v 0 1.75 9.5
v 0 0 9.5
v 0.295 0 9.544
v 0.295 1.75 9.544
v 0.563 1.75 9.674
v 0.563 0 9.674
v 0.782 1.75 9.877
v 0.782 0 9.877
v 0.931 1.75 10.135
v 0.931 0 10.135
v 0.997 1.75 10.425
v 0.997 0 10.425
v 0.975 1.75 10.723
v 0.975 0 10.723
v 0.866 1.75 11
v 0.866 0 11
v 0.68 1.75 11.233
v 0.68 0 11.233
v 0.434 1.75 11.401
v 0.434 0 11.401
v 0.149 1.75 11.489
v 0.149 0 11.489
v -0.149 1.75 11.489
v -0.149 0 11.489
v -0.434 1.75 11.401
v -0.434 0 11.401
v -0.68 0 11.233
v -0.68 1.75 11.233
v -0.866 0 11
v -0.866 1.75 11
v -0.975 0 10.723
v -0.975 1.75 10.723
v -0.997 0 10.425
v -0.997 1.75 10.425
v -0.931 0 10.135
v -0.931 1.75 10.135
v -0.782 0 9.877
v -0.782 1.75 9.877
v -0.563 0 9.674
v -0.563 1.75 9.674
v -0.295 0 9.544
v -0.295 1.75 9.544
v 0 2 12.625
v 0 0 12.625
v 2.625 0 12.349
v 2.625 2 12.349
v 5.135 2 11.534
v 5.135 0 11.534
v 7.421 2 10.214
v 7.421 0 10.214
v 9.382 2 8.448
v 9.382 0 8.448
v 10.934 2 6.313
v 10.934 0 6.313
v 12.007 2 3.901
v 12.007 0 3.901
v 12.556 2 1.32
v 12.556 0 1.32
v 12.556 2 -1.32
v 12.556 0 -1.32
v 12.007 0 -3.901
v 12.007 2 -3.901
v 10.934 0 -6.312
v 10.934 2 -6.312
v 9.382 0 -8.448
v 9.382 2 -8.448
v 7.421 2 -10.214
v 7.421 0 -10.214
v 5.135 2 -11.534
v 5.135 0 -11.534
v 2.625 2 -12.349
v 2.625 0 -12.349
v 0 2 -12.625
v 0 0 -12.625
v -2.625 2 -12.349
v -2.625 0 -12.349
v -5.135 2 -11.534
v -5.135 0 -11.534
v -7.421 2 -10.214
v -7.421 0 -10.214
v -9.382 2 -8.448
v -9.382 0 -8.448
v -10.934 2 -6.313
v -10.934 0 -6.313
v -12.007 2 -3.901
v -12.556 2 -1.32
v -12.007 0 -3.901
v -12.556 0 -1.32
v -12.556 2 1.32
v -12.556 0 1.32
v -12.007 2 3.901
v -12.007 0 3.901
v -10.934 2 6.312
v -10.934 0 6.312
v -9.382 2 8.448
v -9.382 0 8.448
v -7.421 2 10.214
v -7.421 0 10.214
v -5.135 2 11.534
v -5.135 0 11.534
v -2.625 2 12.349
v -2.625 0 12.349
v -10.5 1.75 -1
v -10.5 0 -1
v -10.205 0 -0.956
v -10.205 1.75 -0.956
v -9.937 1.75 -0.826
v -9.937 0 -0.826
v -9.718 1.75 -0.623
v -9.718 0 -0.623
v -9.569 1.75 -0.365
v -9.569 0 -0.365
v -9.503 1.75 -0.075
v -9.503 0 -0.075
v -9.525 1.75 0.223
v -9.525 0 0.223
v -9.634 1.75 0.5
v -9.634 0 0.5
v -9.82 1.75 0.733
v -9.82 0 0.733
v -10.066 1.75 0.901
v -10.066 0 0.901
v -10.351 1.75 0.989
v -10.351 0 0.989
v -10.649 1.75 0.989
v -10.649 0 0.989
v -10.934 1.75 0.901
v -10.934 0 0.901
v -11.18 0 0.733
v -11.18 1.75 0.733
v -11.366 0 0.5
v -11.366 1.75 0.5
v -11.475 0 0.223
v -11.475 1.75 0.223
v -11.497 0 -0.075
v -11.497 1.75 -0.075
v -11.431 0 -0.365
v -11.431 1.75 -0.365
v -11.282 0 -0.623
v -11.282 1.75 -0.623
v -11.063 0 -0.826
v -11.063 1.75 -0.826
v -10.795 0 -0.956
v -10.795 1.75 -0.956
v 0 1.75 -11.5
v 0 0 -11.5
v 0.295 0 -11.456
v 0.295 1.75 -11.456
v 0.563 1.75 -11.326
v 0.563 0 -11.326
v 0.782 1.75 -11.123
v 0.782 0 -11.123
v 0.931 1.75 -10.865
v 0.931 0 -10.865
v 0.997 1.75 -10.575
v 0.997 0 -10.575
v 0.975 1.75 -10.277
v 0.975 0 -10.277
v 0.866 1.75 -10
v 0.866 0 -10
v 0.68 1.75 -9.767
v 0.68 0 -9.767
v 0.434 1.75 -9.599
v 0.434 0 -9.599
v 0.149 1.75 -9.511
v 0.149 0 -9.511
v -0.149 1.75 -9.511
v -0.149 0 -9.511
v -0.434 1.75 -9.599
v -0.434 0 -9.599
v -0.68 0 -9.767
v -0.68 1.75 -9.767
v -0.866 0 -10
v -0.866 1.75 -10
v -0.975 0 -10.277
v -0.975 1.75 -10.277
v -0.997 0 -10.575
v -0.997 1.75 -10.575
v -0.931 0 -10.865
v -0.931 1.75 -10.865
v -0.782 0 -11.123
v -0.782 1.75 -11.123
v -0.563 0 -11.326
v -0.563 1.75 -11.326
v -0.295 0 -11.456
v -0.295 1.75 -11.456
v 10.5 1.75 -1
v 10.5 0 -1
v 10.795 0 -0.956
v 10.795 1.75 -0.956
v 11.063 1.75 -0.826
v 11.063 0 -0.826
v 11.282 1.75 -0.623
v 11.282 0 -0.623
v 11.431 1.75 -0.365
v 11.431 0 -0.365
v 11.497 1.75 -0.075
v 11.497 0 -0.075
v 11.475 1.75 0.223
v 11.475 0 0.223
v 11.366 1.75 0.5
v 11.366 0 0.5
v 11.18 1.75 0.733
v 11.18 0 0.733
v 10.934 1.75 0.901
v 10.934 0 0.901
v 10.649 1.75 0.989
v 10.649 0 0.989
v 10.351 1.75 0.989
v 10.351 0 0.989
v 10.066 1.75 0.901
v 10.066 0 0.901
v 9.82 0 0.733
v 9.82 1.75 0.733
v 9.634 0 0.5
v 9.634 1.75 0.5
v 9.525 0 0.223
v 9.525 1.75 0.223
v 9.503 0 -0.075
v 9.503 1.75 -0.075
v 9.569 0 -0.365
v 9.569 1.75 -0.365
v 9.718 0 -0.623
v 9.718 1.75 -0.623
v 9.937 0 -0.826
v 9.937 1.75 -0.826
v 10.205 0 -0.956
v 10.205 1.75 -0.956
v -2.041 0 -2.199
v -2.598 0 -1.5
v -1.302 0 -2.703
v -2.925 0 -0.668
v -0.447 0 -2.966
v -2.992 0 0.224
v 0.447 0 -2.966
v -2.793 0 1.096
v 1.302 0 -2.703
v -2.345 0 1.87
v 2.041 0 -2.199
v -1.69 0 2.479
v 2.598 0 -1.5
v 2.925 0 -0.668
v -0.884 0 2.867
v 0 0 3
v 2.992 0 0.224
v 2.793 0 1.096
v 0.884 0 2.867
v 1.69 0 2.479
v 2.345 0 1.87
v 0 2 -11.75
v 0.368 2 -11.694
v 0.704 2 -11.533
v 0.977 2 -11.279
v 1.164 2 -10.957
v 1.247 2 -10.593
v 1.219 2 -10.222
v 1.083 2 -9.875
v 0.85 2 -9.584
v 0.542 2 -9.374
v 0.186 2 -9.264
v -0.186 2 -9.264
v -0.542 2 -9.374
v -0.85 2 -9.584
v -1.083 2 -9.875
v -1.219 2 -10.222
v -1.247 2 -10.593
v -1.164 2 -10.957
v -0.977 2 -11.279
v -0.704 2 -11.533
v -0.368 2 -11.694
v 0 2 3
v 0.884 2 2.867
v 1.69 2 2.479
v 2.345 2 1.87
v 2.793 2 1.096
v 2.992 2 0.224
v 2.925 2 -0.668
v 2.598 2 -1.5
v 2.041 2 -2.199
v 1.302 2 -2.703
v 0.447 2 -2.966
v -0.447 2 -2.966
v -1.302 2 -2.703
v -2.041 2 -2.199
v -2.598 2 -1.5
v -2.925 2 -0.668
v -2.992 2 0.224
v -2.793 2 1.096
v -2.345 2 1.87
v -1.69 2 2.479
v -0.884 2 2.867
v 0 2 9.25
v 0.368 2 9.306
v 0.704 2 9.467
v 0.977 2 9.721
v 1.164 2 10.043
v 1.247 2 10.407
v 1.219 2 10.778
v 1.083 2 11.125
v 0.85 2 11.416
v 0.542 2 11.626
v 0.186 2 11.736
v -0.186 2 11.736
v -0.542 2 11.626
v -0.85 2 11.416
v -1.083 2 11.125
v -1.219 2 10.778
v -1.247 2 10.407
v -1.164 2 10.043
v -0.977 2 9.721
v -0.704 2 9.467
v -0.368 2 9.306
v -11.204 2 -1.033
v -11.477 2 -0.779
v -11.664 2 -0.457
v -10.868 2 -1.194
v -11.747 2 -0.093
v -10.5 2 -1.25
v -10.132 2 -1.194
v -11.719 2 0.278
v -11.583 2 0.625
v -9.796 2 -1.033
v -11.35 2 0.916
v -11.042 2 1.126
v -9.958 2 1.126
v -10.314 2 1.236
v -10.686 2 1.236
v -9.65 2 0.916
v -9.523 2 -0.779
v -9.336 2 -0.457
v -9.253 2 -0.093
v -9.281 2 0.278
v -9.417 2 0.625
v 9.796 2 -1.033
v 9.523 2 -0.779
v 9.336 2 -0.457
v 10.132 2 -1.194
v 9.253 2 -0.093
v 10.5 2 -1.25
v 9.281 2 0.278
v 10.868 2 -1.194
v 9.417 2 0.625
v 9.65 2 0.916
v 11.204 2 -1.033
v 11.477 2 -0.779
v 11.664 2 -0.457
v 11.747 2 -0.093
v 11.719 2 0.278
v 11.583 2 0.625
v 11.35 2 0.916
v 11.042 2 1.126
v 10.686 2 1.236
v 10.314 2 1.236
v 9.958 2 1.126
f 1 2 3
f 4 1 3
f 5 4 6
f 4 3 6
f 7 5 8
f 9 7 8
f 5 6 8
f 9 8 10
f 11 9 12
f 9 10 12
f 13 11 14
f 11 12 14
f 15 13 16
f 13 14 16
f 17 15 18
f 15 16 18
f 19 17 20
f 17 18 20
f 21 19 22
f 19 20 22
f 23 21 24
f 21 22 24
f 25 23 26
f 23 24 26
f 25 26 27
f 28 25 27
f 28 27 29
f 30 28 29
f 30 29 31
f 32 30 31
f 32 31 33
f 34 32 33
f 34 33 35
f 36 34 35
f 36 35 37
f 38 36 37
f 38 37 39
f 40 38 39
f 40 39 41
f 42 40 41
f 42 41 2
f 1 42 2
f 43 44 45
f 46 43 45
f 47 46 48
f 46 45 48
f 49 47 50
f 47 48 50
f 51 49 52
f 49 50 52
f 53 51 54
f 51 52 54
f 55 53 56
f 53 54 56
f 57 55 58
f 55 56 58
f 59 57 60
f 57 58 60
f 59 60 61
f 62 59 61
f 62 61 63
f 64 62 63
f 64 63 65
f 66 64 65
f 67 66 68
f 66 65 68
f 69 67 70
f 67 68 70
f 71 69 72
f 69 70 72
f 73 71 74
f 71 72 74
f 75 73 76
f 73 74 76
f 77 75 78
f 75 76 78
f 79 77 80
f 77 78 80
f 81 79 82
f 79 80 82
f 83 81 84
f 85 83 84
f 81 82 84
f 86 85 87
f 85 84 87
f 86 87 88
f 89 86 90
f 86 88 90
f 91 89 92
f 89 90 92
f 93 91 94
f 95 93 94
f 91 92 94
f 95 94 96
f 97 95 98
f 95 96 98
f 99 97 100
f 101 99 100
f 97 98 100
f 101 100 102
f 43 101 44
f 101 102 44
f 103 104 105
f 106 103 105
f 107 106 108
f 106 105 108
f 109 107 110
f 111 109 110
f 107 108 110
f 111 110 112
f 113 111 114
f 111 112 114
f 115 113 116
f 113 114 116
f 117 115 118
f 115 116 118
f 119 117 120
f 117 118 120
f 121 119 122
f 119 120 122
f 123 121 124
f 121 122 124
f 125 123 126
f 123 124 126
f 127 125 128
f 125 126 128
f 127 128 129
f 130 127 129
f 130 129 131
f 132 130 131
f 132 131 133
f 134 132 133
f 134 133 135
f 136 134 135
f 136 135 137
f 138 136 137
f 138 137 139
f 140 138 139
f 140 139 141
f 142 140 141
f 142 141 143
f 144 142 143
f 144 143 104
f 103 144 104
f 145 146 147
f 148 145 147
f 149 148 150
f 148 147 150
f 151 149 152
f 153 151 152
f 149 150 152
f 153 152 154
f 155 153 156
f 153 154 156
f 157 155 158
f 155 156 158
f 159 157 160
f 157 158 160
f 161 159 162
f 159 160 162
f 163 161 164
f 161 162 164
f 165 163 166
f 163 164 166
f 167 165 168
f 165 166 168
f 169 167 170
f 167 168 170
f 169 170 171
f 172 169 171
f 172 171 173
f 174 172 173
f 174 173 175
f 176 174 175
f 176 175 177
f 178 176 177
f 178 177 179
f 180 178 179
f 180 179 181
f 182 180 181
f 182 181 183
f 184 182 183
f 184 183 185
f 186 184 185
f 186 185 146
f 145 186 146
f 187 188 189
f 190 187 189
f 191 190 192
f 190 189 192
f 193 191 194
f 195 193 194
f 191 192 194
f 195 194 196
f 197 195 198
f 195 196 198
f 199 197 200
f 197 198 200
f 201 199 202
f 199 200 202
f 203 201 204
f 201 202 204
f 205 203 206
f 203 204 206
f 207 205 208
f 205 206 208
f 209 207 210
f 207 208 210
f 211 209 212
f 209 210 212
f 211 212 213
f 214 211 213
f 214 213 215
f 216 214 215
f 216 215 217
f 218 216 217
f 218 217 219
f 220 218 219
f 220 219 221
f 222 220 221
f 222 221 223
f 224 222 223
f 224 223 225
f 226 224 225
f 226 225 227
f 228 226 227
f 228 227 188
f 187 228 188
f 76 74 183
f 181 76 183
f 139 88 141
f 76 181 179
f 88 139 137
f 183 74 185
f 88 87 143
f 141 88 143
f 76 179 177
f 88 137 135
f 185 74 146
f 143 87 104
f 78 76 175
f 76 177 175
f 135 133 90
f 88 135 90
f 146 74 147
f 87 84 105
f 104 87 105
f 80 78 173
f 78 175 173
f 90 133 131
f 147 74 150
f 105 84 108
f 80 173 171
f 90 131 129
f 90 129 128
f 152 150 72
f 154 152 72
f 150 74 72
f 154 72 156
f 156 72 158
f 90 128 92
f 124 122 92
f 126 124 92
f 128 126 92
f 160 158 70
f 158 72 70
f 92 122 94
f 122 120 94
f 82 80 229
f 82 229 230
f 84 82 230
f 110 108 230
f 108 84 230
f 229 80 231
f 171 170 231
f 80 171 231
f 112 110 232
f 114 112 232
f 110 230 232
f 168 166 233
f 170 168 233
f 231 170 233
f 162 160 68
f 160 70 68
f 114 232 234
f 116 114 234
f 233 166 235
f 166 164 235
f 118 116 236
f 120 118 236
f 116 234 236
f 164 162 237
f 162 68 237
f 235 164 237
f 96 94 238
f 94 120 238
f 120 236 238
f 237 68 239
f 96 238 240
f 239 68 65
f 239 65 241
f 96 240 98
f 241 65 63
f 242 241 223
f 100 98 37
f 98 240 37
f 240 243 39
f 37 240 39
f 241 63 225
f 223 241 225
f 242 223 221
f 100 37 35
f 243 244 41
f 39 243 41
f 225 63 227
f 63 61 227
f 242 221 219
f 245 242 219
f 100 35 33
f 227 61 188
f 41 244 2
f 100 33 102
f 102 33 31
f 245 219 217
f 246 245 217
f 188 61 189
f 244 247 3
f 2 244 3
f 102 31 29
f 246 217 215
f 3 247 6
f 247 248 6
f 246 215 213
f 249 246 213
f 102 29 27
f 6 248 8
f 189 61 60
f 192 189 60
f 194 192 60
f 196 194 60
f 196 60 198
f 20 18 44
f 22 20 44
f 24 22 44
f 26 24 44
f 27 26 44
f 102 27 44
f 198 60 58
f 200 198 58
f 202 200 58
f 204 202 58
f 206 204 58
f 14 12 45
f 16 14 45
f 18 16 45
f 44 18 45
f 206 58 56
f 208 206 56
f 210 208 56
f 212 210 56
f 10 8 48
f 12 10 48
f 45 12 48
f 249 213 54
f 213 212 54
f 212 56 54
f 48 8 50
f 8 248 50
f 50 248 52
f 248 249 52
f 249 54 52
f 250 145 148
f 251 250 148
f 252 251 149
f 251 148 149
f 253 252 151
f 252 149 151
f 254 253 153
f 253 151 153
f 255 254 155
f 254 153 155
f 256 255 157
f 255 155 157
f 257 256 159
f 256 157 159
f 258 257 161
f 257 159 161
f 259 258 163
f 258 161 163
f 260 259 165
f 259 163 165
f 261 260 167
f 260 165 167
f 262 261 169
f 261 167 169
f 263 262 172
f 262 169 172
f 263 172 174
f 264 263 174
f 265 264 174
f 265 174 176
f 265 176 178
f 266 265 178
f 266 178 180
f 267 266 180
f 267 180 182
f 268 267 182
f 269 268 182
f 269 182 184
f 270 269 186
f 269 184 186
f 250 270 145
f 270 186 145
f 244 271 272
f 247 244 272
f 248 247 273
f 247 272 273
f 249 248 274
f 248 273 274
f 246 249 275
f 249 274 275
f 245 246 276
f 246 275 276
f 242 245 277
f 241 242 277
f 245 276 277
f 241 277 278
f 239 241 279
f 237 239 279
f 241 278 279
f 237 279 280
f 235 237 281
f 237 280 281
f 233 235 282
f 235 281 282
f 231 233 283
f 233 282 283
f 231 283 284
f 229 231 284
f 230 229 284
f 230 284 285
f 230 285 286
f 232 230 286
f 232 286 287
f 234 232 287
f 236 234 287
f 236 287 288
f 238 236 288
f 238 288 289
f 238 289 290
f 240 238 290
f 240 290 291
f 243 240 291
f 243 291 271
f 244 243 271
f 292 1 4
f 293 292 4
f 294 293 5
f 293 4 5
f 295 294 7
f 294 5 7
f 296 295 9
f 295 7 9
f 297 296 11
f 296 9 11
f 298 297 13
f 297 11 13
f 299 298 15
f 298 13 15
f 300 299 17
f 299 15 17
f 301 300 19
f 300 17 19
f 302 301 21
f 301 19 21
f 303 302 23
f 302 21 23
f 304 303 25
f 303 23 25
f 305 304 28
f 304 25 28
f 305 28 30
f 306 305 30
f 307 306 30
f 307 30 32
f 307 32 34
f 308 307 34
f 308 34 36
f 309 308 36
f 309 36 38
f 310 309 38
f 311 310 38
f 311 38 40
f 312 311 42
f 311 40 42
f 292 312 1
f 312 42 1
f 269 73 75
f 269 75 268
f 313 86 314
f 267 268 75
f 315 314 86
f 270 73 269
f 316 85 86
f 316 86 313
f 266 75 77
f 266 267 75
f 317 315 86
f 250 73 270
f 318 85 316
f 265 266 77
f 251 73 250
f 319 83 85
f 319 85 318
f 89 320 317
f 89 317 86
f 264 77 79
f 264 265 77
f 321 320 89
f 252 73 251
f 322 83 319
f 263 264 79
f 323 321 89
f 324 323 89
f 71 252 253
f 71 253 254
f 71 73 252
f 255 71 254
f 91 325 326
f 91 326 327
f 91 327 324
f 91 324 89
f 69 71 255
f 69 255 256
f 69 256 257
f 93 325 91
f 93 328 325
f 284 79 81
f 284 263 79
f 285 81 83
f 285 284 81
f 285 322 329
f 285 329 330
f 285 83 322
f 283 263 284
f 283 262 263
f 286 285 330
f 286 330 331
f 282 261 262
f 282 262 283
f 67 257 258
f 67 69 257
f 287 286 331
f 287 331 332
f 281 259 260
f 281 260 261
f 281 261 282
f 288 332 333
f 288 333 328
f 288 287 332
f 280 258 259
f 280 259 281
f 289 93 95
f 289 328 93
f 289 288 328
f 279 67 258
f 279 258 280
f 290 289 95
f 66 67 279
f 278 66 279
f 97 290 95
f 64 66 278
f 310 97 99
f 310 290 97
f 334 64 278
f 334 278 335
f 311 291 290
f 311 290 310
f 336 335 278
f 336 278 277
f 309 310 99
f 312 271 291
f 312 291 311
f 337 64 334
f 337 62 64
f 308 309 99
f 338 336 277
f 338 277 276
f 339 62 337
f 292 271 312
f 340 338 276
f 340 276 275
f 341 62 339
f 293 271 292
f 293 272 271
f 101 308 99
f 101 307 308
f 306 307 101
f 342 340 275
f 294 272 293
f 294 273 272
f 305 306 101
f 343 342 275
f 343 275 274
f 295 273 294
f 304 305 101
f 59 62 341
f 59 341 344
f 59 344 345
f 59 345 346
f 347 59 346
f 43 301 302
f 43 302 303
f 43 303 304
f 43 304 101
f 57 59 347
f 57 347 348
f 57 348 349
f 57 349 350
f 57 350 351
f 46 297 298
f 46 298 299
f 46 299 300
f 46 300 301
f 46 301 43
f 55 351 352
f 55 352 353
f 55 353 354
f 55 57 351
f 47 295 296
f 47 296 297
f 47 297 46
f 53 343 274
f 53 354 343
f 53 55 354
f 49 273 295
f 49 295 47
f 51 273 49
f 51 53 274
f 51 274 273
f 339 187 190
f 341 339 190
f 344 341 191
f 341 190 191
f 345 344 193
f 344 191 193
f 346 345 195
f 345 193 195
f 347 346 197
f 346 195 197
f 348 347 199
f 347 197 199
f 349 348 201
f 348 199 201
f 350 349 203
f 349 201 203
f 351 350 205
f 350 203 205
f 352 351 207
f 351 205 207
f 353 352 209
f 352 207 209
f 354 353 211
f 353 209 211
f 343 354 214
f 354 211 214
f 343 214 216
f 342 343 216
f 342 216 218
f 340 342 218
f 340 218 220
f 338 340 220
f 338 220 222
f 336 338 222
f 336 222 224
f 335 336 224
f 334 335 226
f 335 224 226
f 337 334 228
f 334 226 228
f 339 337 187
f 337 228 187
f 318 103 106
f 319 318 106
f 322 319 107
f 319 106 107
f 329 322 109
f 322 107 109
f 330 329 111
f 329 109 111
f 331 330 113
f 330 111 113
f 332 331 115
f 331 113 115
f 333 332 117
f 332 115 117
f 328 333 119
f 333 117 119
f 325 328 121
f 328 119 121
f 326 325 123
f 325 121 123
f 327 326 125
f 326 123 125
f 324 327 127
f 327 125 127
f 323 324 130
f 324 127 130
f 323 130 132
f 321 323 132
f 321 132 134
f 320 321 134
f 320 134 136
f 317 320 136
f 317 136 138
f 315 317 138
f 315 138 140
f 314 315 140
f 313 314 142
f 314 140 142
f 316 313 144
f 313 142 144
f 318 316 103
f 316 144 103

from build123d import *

# Parameters (mm, degrees)
SKETCH1_R             = 12.625
BOSS_EXTRUDE1_DEPTH   = 2
SKETCH2_R             = 0.5
CUT_EXTRUDE1_DEPTH    = 18.966113937
F_2_0MM_DOWEL_HOLE1_D = 2
CHAMFER1_SIZE         = 0.25
SKETCH4_R             = 3
CUT_EXTRUDE2_DEPTH    = 10


with BuildPart() as part:
    # Sketch1 → Boss-Extrude1 (new body)
    with BuildSketch(Plane(origin=(0, 0, 0), x_dir=(1, 0, 0), z_dir=(0, 1, 0))):
        with Locations(Location((0, 0, 0), (0, 0, 270))):
            Circle(SKETCH1_R)
    extrude(amount=BOSS_EXTRUDE1_DEPTH)

    # Sketch2 → Cut-Extrude1 (cut, through all)
    with BuildSketch(Plane(origin=(0, 2, 0), x_dir=(1, 0, 0), z_dir=(0, 1, 0))):
        with Locations(Location((0, 10.5, 0), (0, 0, 270))):
            Circle(SKETCH2_R)
        with Locations(Location((10.5, 0, 0), (0, 0, 270))):
            Circle(SKETCH2_R)
        with Locations(Location((0, -10.5, 0), (0, 0, 270))):
            Circle(SKETCH2_R)
        with Locations(Location((-10.5, 0, 0), (0, 0, 270))):
            Circle(SKETCH2_R)
    extrude(amount=-CUT_EXTRUDE1_DEPTH, mode=Mode.SUBTRACT)

    # Ø2.0mm Dowel Hole1 (through all)
    with Locations(Plane(origin=(-10.5, 2, 0), x_dir=(0, 0, 1), z_dir=(0, 1, 0))):
        with Locations((0, 0), (-10.5, 10.5), (0, 21), (10.5, 10.5)):
            Hole(F_2_0MM_DOWEL_HOLE1_D / 2)

    # Chamfer1
    chamfer1_edges = [part.edges().sort_by_distance(p)[0] for p in [
        (0, 2, 11.5),
        (10.5, 2, 1),
        (0, 2, -9.5),
        (-10.5, 2, 1),
    ]]
    chamfer(chamfer1_edges, length=CHAMFER1_SIZE)

    # Sketch4 → Cut-Extrude2 (cut)
    with BuildSketch(Plane(origin=(0, 2, 0), x_dir=(1, 0, 0), z_dir=(0, 1, 0))):
        with Locations(Location((0, 0, 0), (0, 0, 270))):
            Circle(SKETCH4_R)
    extrude(amount=-CUT_EXTRUDE2_DEPTH, mode=Mode.SUBTRACT)


solid = part.part
